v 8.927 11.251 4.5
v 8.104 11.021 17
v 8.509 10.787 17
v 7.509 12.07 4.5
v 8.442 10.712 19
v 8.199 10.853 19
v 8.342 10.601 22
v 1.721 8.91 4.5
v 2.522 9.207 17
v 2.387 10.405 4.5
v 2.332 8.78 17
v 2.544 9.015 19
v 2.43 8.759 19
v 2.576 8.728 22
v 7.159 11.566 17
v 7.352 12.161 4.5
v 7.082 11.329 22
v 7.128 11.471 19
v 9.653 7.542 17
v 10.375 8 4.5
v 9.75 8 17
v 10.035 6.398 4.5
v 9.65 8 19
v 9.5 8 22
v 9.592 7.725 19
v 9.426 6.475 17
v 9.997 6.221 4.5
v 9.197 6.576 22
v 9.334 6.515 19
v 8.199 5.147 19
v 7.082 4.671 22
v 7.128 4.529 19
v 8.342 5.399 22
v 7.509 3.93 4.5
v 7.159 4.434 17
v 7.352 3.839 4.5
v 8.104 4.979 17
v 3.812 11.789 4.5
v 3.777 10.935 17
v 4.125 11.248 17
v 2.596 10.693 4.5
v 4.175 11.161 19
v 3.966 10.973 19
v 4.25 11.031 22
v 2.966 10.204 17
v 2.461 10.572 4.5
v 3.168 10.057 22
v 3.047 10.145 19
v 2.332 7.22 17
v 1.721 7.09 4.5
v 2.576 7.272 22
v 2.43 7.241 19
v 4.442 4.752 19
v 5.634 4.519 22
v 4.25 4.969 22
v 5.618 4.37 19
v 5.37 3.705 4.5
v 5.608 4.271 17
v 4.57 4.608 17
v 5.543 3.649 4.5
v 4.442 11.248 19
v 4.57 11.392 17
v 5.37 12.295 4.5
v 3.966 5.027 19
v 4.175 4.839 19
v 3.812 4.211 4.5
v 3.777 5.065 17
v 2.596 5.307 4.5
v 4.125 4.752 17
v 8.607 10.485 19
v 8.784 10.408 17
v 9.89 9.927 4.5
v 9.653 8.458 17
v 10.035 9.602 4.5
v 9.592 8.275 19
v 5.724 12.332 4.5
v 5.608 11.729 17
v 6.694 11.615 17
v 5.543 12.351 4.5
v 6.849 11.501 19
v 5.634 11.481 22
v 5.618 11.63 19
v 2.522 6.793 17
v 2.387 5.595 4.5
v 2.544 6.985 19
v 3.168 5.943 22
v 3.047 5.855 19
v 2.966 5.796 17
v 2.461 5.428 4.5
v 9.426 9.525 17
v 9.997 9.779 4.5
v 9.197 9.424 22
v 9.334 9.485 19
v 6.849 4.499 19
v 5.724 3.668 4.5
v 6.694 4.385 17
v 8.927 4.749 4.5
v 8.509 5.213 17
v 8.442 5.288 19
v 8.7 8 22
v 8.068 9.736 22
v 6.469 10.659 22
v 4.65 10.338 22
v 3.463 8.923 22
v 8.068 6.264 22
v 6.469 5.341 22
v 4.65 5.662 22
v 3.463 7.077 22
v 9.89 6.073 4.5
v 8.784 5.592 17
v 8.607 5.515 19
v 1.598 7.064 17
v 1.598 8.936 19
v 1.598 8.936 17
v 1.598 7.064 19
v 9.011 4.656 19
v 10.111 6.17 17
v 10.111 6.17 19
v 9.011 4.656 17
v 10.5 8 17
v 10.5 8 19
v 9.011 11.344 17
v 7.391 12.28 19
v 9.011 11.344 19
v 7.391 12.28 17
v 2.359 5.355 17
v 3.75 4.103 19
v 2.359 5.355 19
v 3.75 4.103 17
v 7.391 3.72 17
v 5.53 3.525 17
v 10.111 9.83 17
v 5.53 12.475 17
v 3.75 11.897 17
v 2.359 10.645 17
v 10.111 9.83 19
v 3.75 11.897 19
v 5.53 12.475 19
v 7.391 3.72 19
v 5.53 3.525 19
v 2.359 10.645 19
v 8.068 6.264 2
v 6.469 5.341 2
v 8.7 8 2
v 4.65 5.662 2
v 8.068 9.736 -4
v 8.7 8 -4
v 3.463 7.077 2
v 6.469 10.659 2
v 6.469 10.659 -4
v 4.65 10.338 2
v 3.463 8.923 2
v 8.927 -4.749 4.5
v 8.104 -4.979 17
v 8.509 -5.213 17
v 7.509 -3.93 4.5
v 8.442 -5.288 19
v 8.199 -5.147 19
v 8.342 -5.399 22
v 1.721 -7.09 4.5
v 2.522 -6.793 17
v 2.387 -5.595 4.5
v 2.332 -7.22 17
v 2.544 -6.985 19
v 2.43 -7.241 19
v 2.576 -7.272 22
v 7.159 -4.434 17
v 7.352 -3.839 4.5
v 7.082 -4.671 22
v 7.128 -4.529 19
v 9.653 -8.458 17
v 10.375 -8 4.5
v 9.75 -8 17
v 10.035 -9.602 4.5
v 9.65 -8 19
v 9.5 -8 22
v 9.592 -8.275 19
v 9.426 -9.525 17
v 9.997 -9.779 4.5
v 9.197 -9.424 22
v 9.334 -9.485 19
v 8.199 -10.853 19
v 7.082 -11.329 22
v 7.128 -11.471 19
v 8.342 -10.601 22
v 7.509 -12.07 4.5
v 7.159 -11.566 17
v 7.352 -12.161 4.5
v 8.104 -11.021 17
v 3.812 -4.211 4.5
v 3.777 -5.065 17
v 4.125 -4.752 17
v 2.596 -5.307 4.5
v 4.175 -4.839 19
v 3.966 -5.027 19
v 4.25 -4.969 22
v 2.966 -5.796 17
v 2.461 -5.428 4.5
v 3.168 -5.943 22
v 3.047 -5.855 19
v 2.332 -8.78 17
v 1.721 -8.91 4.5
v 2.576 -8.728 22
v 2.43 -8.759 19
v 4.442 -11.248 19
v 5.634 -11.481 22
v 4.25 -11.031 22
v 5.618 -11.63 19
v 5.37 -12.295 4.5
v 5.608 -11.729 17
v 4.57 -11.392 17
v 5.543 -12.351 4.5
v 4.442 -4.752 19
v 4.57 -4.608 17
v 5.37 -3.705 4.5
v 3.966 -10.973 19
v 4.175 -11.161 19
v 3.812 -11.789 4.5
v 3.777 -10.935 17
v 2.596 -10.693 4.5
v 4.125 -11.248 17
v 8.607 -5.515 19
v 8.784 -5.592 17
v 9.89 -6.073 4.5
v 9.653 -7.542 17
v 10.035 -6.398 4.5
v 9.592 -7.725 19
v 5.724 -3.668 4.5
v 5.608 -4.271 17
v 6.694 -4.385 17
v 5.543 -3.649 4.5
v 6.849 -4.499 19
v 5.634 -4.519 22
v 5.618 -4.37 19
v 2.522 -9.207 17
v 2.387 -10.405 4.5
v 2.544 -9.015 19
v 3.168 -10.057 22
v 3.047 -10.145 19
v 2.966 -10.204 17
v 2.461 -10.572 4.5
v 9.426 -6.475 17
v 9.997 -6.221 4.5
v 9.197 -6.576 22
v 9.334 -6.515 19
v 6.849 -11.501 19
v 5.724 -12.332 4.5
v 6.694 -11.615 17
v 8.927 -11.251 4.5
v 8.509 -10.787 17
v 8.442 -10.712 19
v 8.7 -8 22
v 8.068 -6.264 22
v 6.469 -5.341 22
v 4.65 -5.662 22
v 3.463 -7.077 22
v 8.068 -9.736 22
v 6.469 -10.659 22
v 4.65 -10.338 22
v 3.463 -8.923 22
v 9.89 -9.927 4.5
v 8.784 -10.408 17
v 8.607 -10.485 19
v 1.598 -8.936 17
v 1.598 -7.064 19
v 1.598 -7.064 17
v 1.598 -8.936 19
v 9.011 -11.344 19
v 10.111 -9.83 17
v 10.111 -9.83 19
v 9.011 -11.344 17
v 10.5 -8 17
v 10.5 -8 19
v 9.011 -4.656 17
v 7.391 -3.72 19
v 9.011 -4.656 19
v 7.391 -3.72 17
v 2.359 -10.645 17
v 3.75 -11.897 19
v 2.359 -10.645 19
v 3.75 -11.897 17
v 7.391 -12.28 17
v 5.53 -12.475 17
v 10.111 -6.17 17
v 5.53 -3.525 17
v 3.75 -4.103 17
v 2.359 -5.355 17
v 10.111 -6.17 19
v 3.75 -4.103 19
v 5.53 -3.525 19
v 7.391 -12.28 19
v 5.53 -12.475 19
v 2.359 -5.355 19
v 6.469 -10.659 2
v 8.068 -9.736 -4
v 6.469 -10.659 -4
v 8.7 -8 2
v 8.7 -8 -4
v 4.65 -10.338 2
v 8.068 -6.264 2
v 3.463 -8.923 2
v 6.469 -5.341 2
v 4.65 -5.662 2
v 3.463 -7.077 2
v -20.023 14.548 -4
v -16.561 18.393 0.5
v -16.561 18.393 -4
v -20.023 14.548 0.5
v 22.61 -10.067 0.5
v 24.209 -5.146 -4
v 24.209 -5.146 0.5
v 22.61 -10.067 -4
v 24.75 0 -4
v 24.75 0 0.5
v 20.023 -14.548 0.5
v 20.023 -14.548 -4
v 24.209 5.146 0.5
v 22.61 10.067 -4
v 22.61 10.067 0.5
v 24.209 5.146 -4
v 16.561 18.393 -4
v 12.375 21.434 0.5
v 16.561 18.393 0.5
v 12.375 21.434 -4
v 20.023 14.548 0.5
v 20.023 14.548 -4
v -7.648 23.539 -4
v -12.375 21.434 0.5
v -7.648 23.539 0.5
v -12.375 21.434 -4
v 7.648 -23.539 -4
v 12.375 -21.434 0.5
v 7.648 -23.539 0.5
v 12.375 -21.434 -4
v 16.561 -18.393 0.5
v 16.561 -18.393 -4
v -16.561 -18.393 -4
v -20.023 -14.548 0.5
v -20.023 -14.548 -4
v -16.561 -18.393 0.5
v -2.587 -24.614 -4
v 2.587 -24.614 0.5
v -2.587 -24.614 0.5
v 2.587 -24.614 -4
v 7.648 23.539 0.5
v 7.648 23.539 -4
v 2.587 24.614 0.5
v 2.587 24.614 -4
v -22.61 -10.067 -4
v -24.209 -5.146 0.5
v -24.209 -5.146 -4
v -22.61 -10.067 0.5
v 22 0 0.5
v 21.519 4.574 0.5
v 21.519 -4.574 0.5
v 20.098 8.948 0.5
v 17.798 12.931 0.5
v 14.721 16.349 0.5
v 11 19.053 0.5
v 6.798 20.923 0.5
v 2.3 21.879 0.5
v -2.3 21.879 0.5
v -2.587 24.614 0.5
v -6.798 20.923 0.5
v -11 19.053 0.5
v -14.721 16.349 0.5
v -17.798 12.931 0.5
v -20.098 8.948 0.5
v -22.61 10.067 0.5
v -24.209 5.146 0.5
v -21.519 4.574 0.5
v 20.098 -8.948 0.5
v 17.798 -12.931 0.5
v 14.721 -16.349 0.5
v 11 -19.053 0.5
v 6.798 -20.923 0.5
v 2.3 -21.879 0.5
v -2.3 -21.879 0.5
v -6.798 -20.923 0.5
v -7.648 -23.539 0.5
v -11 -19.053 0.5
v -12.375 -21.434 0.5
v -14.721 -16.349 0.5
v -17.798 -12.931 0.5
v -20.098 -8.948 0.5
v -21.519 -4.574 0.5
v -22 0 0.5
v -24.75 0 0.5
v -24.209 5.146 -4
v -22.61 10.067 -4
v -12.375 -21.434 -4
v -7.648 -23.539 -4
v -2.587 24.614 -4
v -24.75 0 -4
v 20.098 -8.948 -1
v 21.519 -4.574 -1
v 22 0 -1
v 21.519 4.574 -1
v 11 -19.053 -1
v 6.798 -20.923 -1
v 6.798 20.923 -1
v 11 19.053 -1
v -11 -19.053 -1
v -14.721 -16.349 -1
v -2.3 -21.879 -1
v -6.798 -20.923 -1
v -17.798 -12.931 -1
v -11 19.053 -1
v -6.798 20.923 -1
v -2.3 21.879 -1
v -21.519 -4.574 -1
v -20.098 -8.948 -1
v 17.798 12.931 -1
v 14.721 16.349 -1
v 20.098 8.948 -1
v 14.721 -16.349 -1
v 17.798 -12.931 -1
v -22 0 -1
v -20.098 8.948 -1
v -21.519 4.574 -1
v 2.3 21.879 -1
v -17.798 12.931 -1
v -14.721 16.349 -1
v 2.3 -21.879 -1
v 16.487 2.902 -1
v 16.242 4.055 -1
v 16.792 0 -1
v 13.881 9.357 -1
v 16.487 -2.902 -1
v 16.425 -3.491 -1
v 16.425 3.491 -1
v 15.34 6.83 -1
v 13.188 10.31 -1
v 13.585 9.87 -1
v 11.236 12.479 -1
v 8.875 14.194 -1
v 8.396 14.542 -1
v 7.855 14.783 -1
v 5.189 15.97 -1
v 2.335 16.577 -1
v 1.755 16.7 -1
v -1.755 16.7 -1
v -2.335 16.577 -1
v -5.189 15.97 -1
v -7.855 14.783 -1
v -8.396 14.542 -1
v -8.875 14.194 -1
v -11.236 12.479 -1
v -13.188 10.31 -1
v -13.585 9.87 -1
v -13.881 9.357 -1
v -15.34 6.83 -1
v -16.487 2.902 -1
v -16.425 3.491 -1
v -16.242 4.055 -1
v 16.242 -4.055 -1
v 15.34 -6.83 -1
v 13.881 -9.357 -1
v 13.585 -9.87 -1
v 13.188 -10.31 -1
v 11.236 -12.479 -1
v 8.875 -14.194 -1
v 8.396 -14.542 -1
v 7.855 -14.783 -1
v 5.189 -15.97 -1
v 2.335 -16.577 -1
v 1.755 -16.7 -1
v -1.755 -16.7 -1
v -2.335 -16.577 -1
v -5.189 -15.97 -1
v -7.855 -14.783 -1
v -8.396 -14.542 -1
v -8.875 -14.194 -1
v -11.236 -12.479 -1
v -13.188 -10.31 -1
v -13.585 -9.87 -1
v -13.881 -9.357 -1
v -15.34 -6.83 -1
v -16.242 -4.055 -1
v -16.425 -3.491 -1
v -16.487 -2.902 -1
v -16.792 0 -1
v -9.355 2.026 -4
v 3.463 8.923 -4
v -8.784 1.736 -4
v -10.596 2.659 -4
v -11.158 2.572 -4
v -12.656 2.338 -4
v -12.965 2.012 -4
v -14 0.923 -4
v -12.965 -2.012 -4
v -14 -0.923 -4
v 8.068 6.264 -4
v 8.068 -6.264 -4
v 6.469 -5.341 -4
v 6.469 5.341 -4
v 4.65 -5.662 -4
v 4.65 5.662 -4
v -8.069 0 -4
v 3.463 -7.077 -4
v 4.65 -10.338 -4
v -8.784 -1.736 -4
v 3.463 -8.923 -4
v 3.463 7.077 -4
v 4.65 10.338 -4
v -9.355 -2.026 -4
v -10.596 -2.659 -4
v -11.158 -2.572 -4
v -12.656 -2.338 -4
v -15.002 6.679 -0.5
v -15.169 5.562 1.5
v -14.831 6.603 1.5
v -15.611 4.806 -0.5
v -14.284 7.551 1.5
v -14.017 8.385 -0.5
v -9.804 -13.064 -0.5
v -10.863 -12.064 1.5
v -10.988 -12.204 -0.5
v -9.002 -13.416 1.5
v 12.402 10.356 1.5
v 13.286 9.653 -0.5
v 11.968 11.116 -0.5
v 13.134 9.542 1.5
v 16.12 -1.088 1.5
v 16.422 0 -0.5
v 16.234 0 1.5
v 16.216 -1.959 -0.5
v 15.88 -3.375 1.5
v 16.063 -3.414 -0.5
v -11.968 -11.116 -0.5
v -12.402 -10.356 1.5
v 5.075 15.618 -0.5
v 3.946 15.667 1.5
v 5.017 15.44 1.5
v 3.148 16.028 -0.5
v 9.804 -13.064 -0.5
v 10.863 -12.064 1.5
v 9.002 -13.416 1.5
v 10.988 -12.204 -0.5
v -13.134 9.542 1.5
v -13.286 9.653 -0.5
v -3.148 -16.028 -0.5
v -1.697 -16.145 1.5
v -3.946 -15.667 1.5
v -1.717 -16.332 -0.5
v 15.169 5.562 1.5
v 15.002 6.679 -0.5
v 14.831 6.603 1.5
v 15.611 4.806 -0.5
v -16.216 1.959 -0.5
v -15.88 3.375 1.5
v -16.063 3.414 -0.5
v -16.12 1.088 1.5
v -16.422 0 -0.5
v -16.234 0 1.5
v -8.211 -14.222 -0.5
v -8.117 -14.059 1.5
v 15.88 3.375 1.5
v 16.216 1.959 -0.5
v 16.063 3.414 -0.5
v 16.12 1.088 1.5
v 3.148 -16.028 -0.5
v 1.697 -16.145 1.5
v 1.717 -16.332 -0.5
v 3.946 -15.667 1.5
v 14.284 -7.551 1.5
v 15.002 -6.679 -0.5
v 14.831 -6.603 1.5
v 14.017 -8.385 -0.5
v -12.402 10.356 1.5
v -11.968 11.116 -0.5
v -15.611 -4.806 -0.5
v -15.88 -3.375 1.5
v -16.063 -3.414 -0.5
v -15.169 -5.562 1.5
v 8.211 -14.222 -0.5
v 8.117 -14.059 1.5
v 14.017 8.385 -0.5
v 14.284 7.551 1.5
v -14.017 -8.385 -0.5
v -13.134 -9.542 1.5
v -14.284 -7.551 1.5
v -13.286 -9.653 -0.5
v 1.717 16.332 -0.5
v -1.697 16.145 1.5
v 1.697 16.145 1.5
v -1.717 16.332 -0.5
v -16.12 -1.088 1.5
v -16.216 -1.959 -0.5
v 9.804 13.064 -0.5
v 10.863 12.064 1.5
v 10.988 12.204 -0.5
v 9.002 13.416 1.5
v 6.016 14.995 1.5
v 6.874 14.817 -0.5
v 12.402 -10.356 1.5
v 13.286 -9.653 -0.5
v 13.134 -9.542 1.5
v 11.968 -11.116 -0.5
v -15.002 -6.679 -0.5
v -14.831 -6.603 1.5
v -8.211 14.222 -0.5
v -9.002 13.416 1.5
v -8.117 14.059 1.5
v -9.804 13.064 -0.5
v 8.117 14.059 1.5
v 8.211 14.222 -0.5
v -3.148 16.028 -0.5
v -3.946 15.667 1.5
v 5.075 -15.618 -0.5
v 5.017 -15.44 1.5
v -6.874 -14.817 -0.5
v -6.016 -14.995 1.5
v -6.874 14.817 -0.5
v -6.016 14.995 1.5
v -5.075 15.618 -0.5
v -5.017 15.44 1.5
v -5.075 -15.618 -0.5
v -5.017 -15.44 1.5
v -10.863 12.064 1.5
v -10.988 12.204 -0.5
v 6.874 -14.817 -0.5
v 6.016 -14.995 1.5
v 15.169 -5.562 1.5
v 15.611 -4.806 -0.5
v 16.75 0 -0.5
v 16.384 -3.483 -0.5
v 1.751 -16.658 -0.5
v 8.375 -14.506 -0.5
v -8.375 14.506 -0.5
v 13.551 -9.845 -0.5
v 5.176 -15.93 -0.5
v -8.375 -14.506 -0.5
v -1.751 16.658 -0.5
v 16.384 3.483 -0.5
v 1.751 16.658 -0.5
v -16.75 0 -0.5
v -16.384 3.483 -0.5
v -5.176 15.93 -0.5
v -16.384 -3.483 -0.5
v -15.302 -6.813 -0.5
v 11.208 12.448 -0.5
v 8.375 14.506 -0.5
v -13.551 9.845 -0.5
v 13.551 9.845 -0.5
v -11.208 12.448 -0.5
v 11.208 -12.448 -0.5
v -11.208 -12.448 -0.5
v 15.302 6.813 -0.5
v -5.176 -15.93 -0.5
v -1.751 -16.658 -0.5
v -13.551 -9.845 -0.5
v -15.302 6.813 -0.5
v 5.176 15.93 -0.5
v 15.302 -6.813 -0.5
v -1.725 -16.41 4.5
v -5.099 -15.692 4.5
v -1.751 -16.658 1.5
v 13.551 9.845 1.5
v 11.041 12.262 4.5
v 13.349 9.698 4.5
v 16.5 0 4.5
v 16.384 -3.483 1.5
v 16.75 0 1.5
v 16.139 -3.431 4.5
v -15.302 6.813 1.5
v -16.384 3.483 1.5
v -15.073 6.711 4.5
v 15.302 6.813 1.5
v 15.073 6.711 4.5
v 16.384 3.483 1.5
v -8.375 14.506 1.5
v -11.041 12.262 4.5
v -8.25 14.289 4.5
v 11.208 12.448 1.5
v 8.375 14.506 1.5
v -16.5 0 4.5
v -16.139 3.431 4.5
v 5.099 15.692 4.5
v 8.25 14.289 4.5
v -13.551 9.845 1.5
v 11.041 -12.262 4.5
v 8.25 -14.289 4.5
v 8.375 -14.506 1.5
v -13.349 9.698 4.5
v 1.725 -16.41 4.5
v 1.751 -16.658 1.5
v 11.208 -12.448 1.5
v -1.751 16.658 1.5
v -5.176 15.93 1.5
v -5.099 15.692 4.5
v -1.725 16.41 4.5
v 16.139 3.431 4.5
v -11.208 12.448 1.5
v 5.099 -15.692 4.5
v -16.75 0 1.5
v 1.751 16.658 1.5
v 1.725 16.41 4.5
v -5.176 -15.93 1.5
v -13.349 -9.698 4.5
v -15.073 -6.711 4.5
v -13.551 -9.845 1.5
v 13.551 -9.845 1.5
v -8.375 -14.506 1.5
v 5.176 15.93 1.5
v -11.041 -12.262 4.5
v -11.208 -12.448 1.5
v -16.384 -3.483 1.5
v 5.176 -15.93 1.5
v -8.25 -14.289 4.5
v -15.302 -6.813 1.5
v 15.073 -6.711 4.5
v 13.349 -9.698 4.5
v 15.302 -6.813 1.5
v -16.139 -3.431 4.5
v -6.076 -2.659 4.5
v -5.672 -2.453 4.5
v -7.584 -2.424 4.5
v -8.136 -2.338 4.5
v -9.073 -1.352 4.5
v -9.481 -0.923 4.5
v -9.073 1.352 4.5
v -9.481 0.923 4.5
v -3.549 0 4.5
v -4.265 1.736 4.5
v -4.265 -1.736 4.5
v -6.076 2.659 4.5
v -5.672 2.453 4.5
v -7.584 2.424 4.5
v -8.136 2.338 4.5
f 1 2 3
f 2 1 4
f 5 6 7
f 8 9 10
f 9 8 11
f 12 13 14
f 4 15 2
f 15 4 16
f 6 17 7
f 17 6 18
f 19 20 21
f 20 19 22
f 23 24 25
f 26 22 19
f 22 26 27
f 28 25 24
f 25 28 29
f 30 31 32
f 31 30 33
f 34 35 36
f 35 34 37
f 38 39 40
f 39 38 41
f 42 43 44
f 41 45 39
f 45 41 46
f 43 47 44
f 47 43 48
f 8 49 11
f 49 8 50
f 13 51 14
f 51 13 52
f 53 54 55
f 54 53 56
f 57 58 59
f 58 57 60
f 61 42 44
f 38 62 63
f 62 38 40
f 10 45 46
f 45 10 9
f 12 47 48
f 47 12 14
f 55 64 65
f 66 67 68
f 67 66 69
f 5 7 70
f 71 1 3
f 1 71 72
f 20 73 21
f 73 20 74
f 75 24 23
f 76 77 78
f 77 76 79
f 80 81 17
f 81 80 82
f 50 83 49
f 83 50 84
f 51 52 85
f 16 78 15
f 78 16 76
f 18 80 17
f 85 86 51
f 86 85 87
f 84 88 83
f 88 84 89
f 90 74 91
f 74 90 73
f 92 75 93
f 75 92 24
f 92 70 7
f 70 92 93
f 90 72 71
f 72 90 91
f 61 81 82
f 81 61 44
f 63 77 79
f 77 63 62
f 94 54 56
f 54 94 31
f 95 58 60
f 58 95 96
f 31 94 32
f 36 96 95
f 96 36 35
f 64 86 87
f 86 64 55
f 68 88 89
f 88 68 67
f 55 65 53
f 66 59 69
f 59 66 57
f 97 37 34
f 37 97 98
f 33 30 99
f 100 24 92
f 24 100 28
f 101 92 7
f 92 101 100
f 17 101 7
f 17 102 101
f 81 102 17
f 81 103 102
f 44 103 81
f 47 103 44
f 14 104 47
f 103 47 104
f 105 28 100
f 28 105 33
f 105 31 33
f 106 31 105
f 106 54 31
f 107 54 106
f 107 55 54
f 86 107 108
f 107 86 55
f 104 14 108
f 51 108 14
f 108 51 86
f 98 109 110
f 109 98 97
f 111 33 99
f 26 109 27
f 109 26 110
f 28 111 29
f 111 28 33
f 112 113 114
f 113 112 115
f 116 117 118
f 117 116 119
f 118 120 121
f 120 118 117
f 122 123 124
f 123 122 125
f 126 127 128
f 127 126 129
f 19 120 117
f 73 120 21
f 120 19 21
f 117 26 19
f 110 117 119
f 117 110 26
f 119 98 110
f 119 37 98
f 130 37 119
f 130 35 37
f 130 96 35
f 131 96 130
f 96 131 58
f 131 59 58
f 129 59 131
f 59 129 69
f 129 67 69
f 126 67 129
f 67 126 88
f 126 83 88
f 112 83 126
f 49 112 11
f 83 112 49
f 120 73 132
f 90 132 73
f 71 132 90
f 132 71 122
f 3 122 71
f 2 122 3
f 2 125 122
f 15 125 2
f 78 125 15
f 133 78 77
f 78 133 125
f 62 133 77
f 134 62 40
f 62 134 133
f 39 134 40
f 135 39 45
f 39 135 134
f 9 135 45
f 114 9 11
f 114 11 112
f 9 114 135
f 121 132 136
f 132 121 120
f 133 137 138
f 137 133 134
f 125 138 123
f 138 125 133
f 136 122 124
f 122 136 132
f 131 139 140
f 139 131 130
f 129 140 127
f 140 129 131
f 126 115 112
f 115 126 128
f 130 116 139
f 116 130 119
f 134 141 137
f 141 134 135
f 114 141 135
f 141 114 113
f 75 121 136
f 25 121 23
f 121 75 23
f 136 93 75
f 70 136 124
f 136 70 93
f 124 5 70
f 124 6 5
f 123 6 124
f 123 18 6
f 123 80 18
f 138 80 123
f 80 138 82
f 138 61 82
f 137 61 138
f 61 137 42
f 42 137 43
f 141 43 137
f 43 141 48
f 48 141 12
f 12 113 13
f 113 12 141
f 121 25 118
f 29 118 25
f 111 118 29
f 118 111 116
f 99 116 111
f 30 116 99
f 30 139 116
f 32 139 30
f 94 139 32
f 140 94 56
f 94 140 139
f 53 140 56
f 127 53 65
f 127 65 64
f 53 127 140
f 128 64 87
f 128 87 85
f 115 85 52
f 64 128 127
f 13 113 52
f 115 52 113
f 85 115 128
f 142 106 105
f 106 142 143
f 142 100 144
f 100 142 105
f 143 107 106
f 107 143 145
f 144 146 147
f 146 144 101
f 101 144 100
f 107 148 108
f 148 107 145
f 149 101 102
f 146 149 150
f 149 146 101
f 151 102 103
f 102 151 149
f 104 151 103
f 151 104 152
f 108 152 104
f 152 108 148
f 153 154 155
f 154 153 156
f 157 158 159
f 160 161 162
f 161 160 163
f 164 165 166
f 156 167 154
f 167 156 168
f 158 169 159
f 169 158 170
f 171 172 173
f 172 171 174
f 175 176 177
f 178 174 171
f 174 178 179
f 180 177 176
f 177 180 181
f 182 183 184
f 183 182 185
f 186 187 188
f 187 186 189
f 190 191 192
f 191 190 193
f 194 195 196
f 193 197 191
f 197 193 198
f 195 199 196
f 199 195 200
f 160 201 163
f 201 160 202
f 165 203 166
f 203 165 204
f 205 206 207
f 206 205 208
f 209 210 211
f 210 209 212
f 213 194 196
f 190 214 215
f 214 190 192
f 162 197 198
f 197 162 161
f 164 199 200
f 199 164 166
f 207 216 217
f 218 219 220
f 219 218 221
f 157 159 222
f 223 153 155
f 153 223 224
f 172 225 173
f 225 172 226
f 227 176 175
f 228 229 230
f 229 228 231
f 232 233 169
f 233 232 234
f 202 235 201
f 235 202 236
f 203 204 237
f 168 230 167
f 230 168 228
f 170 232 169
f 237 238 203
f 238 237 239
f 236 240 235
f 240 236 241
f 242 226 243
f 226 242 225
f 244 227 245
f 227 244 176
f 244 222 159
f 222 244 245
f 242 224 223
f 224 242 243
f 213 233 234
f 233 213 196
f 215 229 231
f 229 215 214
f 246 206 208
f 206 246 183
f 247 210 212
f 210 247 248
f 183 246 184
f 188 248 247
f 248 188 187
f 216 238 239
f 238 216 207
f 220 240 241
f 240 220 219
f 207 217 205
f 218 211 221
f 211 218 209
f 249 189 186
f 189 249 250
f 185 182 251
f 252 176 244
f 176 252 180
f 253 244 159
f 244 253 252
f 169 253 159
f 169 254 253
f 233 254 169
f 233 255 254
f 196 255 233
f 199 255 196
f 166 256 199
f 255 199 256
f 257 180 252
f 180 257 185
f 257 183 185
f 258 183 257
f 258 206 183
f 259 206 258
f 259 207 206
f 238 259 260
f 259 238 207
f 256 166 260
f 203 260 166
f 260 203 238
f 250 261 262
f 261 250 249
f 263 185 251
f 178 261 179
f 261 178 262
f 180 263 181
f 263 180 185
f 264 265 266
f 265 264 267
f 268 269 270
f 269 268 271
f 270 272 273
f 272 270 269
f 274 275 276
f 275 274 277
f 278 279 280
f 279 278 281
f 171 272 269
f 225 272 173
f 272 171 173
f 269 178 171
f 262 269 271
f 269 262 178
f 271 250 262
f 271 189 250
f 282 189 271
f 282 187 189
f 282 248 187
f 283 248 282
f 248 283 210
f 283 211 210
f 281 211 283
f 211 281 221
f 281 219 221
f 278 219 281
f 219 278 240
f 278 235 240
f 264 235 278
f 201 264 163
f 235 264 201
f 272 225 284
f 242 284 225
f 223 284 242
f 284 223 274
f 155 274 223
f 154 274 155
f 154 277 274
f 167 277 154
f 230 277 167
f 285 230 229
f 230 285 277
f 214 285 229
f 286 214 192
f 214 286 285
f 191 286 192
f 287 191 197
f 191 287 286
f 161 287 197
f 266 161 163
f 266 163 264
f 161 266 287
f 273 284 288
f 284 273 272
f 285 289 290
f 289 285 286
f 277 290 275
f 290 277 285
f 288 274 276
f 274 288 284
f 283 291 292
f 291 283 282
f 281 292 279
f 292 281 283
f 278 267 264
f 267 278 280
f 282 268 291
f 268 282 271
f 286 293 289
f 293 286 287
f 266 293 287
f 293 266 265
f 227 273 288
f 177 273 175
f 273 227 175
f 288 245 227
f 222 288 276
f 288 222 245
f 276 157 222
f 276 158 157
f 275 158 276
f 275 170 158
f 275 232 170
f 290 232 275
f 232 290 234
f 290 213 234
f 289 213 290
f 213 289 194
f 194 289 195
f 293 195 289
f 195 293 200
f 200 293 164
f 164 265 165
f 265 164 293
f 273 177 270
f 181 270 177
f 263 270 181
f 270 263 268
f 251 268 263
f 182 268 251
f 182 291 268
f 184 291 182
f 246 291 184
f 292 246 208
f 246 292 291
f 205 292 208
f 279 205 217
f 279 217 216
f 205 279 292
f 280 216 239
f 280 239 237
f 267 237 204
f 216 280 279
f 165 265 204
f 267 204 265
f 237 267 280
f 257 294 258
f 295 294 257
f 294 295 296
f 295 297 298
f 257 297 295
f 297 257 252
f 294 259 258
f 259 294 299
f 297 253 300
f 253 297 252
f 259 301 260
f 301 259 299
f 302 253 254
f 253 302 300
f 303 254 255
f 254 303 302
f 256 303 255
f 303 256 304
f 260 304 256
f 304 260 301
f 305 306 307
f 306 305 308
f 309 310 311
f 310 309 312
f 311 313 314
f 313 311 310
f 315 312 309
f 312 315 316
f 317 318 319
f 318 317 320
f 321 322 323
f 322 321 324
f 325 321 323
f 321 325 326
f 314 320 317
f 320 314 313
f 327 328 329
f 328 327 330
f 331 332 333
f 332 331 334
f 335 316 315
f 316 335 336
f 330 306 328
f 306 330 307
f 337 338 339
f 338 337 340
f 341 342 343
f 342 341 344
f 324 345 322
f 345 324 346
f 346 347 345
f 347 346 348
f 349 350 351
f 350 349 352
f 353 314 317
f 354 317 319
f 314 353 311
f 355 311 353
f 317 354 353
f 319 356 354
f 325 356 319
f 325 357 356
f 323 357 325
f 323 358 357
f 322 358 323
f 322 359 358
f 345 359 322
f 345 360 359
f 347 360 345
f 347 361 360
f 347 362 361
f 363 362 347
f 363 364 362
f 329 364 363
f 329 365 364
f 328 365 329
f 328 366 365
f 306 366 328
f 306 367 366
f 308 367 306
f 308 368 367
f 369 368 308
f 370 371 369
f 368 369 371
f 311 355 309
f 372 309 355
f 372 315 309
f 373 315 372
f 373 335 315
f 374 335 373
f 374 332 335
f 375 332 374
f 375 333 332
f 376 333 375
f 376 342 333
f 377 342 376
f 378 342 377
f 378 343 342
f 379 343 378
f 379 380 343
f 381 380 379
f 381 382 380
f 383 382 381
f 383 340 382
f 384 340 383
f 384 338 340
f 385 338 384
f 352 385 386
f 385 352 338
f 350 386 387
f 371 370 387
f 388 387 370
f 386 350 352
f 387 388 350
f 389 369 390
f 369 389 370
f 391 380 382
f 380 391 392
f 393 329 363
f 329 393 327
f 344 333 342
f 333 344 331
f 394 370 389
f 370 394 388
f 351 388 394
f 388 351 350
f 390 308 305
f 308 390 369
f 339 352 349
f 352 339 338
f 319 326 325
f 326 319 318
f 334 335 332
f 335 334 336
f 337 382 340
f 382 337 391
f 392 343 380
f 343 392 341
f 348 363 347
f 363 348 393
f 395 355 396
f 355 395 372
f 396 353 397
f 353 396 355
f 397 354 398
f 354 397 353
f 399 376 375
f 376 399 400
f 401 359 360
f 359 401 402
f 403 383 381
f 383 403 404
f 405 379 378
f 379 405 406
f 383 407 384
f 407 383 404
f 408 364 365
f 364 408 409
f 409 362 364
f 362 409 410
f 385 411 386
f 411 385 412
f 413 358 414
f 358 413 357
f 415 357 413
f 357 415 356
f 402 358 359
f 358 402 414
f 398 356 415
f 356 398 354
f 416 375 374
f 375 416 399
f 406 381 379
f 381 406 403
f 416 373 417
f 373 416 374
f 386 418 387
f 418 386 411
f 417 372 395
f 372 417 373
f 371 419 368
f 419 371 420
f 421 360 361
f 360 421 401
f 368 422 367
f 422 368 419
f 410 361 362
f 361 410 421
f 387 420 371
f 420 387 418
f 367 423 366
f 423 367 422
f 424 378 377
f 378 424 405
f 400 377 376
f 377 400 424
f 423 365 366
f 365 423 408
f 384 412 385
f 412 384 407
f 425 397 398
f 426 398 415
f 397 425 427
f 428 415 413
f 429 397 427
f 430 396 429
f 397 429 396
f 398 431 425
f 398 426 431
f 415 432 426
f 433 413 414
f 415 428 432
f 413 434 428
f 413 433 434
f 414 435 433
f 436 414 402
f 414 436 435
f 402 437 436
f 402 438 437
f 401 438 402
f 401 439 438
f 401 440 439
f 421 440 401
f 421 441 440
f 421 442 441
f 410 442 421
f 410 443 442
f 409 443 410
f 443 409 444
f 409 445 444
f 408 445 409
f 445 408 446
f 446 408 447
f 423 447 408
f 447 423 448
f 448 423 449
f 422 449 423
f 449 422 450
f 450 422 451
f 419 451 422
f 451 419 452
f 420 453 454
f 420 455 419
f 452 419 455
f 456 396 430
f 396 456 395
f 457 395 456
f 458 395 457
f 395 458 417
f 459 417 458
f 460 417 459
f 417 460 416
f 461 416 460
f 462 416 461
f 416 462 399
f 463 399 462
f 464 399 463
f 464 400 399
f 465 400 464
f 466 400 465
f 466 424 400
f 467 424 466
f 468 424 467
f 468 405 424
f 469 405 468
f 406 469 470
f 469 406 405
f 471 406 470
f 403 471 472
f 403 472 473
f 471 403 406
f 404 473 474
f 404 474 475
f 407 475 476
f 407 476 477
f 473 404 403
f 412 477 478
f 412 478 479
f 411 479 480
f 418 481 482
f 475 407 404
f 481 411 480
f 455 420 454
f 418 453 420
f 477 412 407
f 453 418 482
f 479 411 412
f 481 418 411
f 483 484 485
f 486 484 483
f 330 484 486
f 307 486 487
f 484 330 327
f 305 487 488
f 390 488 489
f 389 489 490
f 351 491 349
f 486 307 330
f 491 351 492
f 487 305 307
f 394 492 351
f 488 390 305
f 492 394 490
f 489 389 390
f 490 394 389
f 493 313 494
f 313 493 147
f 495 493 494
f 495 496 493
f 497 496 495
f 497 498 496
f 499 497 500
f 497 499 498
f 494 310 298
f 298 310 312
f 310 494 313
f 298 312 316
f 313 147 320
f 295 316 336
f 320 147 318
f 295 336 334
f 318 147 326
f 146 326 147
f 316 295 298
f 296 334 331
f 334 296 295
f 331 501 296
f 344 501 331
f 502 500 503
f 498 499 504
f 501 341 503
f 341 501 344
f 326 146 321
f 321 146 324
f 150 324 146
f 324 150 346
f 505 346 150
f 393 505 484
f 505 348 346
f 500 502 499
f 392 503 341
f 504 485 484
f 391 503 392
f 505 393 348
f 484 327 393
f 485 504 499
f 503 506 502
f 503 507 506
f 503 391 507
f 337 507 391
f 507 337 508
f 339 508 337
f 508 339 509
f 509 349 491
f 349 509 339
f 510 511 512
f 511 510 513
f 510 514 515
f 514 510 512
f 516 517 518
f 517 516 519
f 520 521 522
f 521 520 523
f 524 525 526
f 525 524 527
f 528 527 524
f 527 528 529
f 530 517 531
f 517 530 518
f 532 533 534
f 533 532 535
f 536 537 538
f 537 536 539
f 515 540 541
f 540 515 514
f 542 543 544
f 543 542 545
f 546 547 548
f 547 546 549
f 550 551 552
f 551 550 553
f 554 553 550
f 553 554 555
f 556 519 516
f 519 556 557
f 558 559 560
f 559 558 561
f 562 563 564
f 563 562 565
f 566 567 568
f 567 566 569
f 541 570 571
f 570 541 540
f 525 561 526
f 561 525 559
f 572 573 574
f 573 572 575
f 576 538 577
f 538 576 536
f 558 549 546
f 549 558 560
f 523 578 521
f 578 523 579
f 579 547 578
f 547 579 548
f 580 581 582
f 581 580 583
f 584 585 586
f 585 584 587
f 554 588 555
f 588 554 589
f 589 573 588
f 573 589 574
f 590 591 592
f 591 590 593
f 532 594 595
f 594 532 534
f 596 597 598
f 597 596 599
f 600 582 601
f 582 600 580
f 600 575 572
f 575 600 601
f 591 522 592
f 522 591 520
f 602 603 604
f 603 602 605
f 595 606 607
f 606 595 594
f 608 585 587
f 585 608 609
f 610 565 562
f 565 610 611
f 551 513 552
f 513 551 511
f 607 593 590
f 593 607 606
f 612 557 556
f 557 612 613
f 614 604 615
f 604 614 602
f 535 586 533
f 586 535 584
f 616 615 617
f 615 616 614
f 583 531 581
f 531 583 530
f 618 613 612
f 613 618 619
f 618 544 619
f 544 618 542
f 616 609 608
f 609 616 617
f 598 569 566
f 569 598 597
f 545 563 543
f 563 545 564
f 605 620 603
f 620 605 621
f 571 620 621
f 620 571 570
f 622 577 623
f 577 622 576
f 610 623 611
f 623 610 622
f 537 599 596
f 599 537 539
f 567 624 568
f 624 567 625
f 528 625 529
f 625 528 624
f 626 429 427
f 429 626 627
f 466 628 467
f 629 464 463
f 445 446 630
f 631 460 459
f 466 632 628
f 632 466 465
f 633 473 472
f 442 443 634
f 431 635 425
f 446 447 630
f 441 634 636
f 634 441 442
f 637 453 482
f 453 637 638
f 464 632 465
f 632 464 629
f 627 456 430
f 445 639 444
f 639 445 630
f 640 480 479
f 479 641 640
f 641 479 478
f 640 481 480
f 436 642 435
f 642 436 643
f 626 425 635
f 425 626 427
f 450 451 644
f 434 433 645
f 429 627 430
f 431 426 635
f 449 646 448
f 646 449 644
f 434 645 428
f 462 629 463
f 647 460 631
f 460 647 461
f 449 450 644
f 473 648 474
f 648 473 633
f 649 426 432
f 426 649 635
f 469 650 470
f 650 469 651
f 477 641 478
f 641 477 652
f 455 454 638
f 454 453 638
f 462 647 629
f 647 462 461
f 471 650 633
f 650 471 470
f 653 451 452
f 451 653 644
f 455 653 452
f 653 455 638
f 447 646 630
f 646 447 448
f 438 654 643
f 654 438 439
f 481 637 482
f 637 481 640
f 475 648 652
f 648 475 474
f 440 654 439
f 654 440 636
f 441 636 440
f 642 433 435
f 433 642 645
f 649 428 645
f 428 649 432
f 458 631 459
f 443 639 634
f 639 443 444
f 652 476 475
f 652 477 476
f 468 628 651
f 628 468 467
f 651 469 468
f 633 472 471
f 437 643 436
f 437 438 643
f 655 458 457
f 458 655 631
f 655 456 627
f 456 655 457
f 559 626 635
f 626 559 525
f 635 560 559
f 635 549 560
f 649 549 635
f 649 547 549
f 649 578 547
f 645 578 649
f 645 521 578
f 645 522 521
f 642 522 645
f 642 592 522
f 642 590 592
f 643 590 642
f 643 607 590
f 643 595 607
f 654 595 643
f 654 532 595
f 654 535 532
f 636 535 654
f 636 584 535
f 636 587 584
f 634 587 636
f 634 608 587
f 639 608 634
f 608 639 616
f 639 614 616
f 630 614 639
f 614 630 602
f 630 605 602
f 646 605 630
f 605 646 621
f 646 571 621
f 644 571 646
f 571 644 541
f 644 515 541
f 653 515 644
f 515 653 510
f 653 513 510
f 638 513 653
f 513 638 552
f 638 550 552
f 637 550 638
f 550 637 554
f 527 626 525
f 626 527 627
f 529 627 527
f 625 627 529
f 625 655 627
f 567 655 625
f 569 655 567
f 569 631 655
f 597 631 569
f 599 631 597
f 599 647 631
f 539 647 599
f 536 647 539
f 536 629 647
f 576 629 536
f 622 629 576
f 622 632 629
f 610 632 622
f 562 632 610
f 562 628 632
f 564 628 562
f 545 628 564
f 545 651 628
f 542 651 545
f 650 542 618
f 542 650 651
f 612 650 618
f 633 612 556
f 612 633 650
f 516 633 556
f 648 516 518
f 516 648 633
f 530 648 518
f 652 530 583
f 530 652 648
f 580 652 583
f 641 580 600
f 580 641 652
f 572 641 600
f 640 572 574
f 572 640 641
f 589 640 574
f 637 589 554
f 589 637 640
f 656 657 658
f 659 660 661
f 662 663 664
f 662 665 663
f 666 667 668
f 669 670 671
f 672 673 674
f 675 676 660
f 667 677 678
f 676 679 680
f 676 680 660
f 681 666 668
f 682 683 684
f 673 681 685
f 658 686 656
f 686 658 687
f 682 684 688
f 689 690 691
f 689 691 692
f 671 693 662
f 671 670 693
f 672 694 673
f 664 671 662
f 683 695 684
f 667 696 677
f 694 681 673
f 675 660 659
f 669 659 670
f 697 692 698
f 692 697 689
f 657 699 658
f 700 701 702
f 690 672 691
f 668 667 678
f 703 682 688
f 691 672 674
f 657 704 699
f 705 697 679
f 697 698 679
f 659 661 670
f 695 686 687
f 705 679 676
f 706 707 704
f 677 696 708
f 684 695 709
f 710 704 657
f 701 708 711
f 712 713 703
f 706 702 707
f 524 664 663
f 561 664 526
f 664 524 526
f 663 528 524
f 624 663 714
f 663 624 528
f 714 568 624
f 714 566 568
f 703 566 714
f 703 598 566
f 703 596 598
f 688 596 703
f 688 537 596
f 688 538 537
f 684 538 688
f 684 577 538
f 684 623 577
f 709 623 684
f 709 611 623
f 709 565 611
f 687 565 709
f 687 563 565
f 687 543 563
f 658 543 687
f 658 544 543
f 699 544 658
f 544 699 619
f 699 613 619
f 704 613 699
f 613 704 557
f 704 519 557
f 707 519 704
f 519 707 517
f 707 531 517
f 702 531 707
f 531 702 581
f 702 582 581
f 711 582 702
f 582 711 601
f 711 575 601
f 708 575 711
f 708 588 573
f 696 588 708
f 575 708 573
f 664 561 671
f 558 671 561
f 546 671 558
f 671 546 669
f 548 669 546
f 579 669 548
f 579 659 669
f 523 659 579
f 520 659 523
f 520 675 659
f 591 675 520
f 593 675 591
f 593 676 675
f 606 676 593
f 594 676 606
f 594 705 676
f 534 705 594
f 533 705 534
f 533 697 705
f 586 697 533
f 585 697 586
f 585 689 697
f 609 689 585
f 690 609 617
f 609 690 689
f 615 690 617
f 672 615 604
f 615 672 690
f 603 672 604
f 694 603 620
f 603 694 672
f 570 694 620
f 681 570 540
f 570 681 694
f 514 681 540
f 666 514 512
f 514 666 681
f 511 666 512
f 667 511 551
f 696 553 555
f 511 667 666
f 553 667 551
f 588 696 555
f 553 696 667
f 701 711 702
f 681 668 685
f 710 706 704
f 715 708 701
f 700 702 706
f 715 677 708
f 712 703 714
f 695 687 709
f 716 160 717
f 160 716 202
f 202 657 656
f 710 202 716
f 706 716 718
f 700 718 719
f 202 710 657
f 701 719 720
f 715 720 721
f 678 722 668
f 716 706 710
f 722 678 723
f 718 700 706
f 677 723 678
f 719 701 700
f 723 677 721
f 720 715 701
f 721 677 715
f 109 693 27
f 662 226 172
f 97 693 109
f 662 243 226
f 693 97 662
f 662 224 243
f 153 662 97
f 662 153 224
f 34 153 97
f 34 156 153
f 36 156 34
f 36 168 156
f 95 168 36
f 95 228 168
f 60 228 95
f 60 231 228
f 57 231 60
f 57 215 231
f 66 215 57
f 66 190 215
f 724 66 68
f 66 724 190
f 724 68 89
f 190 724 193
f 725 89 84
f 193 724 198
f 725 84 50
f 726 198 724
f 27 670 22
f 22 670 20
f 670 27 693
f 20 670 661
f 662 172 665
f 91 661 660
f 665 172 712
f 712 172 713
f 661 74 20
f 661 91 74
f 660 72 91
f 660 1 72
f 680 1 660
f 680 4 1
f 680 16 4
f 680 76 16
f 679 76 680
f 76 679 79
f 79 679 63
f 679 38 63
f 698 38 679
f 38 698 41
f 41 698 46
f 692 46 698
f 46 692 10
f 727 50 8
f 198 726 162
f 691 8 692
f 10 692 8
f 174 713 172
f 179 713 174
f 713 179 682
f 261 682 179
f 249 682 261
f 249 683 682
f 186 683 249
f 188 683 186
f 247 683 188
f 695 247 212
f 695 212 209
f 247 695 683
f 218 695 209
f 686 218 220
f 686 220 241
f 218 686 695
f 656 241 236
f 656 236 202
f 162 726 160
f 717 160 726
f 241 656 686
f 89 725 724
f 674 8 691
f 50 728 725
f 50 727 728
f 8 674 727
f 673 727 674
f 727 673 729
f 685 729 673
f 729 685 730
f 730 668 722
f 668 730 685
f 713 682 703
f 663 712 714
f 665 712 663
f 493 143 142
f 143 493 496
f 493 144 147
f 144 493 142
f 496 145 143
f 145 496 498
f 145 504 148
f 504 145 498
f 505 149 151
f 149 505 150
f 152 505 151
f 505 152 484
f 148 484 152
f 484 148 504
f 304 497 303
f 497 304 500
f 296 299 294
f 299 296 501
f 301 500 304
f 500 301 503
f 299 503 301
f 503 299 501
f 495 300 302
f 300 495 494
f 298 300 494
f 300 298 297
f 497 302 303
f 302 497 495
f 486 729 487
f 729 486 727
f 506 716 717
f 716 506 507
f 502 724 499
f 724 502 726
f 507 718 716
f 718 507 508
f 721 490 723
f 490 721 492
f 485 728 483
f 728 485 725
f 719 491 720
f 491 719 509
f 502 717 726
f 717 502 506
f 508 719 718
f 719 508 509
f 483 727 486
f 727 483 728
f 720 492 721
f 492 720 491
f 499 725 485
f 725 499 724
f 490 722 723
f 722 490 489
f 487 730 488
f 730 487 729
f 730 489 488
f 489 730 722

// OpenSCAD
ventradius = 2.7;
fillradius = 2.7;

module base(size) {

   translate([0,0,0.5]) {
    difference() {
     cylinder(r=3*size/2,h=2,center=true);
     cylinder(r=(3*size/2)-size/6,h=3,center=true);
    } 
   }

   translate([0,0,2.5])
    cylinder(r=3*size/2,h=3,center=true);
	cylinder(r1=size-0.5, r2=size+0.25, h=8, center=true);
	translate([0,0,2])
            cylinder(r2=size+0.5,r1=size+0.25, h=3, center=true);
	translate([0,0,-3])
            cylinder(r2=size+0.25,r1=size, h=3, center=true);
}

module tube(outer,inner,length) {
  difference() {
   union() {
	cylinder(r1=outer,r2=outer+1,h=length,center=true);
  translate([0,0,4-length/2])
     cylinder(r=outer+1,h=2,center=true);
   }
	cylinder(r=inner,h=length+2,center=true);
  }

}
module septa() {
translate([6,-8,-12])tube(3.5,fillradius,20);
translate([6,8,-12]) tube(3.5,fillradius,20);

difference() {
	base(16.5);
	translate([6,-8,0])
           cylinder(r=fillradius,h=20,center=true);
	translate([6,8,0])
           cylinder(r=fillradius,h=20,center=true);
	translate([-9,0,0])
	    rotate([0,-28,0])
           cylinder(r=ventradius,h=20,center=true);
}
}

rotate([180,0,0]) septa();
